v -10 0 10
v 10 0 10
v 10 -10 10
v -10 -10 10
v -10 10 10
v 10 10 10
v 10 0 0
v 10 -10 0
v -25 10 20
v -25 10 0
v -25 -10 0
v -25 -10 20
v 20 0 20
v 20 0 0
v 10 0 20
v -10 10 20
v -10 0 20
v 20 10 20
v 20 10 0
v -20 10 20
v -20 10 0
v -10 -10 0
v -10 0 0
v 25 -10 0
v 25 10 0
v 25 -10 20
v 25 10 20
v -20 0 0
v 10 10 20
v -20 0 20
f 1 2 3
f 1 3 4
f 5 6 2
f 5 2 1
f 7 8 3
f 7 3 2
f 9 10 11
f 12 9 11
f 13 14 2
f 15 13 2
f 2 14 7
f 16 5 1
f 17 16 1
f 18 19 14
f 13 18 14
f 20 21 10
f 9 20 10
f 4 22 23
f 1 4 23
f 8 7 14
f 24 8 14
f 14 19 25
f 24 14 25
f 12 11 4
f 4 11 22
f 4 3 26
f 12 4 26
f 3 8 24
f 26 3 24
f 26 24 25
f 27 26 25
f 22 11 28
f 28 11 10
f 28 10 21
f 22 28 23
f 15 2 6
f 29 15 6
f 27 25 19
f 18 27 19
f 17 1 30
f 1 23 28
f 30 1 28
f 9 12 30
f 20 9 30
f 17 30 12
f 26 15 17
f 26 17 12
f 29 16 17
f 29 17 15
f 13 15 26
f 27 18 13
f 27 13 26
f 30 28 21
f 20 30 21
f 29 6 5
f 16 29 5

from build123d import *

# Parameters (mm, degrees)
EXTRUDE_1_DEPTH     = 20
SKETCH_2_W          = 20
SKETCH_2_H          = 20
CUT_EXTRUDE_1_DEPTH = 10


with BuildPart() as part:
    # 草圖1 → 填料-伸長1 (new body)
    with BuildSketch(Plane.XY):
        Polygon((-20, 10), (-25, 10), (-25, -10), (25, -10), (25, 10), (20, 10), (20, 0), (10, 0), (10, 10), (-10, 10), (-10, 0), (-20, 0), align=None)
    extrude(amount=EXTRUDE_1_DEPTH)

    # 草圖2 → 除料-伸長1 (cut)
    with BuildSketch(Plane(origin=(0, 0, 0), x_dir=(-1, 0, 0), z_dir=(0, 0, -1))):
        Rectangle(SKETCH_2_W, SKETCH_2_H)
    extrude(amount=-CUT_EXTRUDE_1_DEPTH, mode=Mode.SUBTRACT)


solid = part.part
